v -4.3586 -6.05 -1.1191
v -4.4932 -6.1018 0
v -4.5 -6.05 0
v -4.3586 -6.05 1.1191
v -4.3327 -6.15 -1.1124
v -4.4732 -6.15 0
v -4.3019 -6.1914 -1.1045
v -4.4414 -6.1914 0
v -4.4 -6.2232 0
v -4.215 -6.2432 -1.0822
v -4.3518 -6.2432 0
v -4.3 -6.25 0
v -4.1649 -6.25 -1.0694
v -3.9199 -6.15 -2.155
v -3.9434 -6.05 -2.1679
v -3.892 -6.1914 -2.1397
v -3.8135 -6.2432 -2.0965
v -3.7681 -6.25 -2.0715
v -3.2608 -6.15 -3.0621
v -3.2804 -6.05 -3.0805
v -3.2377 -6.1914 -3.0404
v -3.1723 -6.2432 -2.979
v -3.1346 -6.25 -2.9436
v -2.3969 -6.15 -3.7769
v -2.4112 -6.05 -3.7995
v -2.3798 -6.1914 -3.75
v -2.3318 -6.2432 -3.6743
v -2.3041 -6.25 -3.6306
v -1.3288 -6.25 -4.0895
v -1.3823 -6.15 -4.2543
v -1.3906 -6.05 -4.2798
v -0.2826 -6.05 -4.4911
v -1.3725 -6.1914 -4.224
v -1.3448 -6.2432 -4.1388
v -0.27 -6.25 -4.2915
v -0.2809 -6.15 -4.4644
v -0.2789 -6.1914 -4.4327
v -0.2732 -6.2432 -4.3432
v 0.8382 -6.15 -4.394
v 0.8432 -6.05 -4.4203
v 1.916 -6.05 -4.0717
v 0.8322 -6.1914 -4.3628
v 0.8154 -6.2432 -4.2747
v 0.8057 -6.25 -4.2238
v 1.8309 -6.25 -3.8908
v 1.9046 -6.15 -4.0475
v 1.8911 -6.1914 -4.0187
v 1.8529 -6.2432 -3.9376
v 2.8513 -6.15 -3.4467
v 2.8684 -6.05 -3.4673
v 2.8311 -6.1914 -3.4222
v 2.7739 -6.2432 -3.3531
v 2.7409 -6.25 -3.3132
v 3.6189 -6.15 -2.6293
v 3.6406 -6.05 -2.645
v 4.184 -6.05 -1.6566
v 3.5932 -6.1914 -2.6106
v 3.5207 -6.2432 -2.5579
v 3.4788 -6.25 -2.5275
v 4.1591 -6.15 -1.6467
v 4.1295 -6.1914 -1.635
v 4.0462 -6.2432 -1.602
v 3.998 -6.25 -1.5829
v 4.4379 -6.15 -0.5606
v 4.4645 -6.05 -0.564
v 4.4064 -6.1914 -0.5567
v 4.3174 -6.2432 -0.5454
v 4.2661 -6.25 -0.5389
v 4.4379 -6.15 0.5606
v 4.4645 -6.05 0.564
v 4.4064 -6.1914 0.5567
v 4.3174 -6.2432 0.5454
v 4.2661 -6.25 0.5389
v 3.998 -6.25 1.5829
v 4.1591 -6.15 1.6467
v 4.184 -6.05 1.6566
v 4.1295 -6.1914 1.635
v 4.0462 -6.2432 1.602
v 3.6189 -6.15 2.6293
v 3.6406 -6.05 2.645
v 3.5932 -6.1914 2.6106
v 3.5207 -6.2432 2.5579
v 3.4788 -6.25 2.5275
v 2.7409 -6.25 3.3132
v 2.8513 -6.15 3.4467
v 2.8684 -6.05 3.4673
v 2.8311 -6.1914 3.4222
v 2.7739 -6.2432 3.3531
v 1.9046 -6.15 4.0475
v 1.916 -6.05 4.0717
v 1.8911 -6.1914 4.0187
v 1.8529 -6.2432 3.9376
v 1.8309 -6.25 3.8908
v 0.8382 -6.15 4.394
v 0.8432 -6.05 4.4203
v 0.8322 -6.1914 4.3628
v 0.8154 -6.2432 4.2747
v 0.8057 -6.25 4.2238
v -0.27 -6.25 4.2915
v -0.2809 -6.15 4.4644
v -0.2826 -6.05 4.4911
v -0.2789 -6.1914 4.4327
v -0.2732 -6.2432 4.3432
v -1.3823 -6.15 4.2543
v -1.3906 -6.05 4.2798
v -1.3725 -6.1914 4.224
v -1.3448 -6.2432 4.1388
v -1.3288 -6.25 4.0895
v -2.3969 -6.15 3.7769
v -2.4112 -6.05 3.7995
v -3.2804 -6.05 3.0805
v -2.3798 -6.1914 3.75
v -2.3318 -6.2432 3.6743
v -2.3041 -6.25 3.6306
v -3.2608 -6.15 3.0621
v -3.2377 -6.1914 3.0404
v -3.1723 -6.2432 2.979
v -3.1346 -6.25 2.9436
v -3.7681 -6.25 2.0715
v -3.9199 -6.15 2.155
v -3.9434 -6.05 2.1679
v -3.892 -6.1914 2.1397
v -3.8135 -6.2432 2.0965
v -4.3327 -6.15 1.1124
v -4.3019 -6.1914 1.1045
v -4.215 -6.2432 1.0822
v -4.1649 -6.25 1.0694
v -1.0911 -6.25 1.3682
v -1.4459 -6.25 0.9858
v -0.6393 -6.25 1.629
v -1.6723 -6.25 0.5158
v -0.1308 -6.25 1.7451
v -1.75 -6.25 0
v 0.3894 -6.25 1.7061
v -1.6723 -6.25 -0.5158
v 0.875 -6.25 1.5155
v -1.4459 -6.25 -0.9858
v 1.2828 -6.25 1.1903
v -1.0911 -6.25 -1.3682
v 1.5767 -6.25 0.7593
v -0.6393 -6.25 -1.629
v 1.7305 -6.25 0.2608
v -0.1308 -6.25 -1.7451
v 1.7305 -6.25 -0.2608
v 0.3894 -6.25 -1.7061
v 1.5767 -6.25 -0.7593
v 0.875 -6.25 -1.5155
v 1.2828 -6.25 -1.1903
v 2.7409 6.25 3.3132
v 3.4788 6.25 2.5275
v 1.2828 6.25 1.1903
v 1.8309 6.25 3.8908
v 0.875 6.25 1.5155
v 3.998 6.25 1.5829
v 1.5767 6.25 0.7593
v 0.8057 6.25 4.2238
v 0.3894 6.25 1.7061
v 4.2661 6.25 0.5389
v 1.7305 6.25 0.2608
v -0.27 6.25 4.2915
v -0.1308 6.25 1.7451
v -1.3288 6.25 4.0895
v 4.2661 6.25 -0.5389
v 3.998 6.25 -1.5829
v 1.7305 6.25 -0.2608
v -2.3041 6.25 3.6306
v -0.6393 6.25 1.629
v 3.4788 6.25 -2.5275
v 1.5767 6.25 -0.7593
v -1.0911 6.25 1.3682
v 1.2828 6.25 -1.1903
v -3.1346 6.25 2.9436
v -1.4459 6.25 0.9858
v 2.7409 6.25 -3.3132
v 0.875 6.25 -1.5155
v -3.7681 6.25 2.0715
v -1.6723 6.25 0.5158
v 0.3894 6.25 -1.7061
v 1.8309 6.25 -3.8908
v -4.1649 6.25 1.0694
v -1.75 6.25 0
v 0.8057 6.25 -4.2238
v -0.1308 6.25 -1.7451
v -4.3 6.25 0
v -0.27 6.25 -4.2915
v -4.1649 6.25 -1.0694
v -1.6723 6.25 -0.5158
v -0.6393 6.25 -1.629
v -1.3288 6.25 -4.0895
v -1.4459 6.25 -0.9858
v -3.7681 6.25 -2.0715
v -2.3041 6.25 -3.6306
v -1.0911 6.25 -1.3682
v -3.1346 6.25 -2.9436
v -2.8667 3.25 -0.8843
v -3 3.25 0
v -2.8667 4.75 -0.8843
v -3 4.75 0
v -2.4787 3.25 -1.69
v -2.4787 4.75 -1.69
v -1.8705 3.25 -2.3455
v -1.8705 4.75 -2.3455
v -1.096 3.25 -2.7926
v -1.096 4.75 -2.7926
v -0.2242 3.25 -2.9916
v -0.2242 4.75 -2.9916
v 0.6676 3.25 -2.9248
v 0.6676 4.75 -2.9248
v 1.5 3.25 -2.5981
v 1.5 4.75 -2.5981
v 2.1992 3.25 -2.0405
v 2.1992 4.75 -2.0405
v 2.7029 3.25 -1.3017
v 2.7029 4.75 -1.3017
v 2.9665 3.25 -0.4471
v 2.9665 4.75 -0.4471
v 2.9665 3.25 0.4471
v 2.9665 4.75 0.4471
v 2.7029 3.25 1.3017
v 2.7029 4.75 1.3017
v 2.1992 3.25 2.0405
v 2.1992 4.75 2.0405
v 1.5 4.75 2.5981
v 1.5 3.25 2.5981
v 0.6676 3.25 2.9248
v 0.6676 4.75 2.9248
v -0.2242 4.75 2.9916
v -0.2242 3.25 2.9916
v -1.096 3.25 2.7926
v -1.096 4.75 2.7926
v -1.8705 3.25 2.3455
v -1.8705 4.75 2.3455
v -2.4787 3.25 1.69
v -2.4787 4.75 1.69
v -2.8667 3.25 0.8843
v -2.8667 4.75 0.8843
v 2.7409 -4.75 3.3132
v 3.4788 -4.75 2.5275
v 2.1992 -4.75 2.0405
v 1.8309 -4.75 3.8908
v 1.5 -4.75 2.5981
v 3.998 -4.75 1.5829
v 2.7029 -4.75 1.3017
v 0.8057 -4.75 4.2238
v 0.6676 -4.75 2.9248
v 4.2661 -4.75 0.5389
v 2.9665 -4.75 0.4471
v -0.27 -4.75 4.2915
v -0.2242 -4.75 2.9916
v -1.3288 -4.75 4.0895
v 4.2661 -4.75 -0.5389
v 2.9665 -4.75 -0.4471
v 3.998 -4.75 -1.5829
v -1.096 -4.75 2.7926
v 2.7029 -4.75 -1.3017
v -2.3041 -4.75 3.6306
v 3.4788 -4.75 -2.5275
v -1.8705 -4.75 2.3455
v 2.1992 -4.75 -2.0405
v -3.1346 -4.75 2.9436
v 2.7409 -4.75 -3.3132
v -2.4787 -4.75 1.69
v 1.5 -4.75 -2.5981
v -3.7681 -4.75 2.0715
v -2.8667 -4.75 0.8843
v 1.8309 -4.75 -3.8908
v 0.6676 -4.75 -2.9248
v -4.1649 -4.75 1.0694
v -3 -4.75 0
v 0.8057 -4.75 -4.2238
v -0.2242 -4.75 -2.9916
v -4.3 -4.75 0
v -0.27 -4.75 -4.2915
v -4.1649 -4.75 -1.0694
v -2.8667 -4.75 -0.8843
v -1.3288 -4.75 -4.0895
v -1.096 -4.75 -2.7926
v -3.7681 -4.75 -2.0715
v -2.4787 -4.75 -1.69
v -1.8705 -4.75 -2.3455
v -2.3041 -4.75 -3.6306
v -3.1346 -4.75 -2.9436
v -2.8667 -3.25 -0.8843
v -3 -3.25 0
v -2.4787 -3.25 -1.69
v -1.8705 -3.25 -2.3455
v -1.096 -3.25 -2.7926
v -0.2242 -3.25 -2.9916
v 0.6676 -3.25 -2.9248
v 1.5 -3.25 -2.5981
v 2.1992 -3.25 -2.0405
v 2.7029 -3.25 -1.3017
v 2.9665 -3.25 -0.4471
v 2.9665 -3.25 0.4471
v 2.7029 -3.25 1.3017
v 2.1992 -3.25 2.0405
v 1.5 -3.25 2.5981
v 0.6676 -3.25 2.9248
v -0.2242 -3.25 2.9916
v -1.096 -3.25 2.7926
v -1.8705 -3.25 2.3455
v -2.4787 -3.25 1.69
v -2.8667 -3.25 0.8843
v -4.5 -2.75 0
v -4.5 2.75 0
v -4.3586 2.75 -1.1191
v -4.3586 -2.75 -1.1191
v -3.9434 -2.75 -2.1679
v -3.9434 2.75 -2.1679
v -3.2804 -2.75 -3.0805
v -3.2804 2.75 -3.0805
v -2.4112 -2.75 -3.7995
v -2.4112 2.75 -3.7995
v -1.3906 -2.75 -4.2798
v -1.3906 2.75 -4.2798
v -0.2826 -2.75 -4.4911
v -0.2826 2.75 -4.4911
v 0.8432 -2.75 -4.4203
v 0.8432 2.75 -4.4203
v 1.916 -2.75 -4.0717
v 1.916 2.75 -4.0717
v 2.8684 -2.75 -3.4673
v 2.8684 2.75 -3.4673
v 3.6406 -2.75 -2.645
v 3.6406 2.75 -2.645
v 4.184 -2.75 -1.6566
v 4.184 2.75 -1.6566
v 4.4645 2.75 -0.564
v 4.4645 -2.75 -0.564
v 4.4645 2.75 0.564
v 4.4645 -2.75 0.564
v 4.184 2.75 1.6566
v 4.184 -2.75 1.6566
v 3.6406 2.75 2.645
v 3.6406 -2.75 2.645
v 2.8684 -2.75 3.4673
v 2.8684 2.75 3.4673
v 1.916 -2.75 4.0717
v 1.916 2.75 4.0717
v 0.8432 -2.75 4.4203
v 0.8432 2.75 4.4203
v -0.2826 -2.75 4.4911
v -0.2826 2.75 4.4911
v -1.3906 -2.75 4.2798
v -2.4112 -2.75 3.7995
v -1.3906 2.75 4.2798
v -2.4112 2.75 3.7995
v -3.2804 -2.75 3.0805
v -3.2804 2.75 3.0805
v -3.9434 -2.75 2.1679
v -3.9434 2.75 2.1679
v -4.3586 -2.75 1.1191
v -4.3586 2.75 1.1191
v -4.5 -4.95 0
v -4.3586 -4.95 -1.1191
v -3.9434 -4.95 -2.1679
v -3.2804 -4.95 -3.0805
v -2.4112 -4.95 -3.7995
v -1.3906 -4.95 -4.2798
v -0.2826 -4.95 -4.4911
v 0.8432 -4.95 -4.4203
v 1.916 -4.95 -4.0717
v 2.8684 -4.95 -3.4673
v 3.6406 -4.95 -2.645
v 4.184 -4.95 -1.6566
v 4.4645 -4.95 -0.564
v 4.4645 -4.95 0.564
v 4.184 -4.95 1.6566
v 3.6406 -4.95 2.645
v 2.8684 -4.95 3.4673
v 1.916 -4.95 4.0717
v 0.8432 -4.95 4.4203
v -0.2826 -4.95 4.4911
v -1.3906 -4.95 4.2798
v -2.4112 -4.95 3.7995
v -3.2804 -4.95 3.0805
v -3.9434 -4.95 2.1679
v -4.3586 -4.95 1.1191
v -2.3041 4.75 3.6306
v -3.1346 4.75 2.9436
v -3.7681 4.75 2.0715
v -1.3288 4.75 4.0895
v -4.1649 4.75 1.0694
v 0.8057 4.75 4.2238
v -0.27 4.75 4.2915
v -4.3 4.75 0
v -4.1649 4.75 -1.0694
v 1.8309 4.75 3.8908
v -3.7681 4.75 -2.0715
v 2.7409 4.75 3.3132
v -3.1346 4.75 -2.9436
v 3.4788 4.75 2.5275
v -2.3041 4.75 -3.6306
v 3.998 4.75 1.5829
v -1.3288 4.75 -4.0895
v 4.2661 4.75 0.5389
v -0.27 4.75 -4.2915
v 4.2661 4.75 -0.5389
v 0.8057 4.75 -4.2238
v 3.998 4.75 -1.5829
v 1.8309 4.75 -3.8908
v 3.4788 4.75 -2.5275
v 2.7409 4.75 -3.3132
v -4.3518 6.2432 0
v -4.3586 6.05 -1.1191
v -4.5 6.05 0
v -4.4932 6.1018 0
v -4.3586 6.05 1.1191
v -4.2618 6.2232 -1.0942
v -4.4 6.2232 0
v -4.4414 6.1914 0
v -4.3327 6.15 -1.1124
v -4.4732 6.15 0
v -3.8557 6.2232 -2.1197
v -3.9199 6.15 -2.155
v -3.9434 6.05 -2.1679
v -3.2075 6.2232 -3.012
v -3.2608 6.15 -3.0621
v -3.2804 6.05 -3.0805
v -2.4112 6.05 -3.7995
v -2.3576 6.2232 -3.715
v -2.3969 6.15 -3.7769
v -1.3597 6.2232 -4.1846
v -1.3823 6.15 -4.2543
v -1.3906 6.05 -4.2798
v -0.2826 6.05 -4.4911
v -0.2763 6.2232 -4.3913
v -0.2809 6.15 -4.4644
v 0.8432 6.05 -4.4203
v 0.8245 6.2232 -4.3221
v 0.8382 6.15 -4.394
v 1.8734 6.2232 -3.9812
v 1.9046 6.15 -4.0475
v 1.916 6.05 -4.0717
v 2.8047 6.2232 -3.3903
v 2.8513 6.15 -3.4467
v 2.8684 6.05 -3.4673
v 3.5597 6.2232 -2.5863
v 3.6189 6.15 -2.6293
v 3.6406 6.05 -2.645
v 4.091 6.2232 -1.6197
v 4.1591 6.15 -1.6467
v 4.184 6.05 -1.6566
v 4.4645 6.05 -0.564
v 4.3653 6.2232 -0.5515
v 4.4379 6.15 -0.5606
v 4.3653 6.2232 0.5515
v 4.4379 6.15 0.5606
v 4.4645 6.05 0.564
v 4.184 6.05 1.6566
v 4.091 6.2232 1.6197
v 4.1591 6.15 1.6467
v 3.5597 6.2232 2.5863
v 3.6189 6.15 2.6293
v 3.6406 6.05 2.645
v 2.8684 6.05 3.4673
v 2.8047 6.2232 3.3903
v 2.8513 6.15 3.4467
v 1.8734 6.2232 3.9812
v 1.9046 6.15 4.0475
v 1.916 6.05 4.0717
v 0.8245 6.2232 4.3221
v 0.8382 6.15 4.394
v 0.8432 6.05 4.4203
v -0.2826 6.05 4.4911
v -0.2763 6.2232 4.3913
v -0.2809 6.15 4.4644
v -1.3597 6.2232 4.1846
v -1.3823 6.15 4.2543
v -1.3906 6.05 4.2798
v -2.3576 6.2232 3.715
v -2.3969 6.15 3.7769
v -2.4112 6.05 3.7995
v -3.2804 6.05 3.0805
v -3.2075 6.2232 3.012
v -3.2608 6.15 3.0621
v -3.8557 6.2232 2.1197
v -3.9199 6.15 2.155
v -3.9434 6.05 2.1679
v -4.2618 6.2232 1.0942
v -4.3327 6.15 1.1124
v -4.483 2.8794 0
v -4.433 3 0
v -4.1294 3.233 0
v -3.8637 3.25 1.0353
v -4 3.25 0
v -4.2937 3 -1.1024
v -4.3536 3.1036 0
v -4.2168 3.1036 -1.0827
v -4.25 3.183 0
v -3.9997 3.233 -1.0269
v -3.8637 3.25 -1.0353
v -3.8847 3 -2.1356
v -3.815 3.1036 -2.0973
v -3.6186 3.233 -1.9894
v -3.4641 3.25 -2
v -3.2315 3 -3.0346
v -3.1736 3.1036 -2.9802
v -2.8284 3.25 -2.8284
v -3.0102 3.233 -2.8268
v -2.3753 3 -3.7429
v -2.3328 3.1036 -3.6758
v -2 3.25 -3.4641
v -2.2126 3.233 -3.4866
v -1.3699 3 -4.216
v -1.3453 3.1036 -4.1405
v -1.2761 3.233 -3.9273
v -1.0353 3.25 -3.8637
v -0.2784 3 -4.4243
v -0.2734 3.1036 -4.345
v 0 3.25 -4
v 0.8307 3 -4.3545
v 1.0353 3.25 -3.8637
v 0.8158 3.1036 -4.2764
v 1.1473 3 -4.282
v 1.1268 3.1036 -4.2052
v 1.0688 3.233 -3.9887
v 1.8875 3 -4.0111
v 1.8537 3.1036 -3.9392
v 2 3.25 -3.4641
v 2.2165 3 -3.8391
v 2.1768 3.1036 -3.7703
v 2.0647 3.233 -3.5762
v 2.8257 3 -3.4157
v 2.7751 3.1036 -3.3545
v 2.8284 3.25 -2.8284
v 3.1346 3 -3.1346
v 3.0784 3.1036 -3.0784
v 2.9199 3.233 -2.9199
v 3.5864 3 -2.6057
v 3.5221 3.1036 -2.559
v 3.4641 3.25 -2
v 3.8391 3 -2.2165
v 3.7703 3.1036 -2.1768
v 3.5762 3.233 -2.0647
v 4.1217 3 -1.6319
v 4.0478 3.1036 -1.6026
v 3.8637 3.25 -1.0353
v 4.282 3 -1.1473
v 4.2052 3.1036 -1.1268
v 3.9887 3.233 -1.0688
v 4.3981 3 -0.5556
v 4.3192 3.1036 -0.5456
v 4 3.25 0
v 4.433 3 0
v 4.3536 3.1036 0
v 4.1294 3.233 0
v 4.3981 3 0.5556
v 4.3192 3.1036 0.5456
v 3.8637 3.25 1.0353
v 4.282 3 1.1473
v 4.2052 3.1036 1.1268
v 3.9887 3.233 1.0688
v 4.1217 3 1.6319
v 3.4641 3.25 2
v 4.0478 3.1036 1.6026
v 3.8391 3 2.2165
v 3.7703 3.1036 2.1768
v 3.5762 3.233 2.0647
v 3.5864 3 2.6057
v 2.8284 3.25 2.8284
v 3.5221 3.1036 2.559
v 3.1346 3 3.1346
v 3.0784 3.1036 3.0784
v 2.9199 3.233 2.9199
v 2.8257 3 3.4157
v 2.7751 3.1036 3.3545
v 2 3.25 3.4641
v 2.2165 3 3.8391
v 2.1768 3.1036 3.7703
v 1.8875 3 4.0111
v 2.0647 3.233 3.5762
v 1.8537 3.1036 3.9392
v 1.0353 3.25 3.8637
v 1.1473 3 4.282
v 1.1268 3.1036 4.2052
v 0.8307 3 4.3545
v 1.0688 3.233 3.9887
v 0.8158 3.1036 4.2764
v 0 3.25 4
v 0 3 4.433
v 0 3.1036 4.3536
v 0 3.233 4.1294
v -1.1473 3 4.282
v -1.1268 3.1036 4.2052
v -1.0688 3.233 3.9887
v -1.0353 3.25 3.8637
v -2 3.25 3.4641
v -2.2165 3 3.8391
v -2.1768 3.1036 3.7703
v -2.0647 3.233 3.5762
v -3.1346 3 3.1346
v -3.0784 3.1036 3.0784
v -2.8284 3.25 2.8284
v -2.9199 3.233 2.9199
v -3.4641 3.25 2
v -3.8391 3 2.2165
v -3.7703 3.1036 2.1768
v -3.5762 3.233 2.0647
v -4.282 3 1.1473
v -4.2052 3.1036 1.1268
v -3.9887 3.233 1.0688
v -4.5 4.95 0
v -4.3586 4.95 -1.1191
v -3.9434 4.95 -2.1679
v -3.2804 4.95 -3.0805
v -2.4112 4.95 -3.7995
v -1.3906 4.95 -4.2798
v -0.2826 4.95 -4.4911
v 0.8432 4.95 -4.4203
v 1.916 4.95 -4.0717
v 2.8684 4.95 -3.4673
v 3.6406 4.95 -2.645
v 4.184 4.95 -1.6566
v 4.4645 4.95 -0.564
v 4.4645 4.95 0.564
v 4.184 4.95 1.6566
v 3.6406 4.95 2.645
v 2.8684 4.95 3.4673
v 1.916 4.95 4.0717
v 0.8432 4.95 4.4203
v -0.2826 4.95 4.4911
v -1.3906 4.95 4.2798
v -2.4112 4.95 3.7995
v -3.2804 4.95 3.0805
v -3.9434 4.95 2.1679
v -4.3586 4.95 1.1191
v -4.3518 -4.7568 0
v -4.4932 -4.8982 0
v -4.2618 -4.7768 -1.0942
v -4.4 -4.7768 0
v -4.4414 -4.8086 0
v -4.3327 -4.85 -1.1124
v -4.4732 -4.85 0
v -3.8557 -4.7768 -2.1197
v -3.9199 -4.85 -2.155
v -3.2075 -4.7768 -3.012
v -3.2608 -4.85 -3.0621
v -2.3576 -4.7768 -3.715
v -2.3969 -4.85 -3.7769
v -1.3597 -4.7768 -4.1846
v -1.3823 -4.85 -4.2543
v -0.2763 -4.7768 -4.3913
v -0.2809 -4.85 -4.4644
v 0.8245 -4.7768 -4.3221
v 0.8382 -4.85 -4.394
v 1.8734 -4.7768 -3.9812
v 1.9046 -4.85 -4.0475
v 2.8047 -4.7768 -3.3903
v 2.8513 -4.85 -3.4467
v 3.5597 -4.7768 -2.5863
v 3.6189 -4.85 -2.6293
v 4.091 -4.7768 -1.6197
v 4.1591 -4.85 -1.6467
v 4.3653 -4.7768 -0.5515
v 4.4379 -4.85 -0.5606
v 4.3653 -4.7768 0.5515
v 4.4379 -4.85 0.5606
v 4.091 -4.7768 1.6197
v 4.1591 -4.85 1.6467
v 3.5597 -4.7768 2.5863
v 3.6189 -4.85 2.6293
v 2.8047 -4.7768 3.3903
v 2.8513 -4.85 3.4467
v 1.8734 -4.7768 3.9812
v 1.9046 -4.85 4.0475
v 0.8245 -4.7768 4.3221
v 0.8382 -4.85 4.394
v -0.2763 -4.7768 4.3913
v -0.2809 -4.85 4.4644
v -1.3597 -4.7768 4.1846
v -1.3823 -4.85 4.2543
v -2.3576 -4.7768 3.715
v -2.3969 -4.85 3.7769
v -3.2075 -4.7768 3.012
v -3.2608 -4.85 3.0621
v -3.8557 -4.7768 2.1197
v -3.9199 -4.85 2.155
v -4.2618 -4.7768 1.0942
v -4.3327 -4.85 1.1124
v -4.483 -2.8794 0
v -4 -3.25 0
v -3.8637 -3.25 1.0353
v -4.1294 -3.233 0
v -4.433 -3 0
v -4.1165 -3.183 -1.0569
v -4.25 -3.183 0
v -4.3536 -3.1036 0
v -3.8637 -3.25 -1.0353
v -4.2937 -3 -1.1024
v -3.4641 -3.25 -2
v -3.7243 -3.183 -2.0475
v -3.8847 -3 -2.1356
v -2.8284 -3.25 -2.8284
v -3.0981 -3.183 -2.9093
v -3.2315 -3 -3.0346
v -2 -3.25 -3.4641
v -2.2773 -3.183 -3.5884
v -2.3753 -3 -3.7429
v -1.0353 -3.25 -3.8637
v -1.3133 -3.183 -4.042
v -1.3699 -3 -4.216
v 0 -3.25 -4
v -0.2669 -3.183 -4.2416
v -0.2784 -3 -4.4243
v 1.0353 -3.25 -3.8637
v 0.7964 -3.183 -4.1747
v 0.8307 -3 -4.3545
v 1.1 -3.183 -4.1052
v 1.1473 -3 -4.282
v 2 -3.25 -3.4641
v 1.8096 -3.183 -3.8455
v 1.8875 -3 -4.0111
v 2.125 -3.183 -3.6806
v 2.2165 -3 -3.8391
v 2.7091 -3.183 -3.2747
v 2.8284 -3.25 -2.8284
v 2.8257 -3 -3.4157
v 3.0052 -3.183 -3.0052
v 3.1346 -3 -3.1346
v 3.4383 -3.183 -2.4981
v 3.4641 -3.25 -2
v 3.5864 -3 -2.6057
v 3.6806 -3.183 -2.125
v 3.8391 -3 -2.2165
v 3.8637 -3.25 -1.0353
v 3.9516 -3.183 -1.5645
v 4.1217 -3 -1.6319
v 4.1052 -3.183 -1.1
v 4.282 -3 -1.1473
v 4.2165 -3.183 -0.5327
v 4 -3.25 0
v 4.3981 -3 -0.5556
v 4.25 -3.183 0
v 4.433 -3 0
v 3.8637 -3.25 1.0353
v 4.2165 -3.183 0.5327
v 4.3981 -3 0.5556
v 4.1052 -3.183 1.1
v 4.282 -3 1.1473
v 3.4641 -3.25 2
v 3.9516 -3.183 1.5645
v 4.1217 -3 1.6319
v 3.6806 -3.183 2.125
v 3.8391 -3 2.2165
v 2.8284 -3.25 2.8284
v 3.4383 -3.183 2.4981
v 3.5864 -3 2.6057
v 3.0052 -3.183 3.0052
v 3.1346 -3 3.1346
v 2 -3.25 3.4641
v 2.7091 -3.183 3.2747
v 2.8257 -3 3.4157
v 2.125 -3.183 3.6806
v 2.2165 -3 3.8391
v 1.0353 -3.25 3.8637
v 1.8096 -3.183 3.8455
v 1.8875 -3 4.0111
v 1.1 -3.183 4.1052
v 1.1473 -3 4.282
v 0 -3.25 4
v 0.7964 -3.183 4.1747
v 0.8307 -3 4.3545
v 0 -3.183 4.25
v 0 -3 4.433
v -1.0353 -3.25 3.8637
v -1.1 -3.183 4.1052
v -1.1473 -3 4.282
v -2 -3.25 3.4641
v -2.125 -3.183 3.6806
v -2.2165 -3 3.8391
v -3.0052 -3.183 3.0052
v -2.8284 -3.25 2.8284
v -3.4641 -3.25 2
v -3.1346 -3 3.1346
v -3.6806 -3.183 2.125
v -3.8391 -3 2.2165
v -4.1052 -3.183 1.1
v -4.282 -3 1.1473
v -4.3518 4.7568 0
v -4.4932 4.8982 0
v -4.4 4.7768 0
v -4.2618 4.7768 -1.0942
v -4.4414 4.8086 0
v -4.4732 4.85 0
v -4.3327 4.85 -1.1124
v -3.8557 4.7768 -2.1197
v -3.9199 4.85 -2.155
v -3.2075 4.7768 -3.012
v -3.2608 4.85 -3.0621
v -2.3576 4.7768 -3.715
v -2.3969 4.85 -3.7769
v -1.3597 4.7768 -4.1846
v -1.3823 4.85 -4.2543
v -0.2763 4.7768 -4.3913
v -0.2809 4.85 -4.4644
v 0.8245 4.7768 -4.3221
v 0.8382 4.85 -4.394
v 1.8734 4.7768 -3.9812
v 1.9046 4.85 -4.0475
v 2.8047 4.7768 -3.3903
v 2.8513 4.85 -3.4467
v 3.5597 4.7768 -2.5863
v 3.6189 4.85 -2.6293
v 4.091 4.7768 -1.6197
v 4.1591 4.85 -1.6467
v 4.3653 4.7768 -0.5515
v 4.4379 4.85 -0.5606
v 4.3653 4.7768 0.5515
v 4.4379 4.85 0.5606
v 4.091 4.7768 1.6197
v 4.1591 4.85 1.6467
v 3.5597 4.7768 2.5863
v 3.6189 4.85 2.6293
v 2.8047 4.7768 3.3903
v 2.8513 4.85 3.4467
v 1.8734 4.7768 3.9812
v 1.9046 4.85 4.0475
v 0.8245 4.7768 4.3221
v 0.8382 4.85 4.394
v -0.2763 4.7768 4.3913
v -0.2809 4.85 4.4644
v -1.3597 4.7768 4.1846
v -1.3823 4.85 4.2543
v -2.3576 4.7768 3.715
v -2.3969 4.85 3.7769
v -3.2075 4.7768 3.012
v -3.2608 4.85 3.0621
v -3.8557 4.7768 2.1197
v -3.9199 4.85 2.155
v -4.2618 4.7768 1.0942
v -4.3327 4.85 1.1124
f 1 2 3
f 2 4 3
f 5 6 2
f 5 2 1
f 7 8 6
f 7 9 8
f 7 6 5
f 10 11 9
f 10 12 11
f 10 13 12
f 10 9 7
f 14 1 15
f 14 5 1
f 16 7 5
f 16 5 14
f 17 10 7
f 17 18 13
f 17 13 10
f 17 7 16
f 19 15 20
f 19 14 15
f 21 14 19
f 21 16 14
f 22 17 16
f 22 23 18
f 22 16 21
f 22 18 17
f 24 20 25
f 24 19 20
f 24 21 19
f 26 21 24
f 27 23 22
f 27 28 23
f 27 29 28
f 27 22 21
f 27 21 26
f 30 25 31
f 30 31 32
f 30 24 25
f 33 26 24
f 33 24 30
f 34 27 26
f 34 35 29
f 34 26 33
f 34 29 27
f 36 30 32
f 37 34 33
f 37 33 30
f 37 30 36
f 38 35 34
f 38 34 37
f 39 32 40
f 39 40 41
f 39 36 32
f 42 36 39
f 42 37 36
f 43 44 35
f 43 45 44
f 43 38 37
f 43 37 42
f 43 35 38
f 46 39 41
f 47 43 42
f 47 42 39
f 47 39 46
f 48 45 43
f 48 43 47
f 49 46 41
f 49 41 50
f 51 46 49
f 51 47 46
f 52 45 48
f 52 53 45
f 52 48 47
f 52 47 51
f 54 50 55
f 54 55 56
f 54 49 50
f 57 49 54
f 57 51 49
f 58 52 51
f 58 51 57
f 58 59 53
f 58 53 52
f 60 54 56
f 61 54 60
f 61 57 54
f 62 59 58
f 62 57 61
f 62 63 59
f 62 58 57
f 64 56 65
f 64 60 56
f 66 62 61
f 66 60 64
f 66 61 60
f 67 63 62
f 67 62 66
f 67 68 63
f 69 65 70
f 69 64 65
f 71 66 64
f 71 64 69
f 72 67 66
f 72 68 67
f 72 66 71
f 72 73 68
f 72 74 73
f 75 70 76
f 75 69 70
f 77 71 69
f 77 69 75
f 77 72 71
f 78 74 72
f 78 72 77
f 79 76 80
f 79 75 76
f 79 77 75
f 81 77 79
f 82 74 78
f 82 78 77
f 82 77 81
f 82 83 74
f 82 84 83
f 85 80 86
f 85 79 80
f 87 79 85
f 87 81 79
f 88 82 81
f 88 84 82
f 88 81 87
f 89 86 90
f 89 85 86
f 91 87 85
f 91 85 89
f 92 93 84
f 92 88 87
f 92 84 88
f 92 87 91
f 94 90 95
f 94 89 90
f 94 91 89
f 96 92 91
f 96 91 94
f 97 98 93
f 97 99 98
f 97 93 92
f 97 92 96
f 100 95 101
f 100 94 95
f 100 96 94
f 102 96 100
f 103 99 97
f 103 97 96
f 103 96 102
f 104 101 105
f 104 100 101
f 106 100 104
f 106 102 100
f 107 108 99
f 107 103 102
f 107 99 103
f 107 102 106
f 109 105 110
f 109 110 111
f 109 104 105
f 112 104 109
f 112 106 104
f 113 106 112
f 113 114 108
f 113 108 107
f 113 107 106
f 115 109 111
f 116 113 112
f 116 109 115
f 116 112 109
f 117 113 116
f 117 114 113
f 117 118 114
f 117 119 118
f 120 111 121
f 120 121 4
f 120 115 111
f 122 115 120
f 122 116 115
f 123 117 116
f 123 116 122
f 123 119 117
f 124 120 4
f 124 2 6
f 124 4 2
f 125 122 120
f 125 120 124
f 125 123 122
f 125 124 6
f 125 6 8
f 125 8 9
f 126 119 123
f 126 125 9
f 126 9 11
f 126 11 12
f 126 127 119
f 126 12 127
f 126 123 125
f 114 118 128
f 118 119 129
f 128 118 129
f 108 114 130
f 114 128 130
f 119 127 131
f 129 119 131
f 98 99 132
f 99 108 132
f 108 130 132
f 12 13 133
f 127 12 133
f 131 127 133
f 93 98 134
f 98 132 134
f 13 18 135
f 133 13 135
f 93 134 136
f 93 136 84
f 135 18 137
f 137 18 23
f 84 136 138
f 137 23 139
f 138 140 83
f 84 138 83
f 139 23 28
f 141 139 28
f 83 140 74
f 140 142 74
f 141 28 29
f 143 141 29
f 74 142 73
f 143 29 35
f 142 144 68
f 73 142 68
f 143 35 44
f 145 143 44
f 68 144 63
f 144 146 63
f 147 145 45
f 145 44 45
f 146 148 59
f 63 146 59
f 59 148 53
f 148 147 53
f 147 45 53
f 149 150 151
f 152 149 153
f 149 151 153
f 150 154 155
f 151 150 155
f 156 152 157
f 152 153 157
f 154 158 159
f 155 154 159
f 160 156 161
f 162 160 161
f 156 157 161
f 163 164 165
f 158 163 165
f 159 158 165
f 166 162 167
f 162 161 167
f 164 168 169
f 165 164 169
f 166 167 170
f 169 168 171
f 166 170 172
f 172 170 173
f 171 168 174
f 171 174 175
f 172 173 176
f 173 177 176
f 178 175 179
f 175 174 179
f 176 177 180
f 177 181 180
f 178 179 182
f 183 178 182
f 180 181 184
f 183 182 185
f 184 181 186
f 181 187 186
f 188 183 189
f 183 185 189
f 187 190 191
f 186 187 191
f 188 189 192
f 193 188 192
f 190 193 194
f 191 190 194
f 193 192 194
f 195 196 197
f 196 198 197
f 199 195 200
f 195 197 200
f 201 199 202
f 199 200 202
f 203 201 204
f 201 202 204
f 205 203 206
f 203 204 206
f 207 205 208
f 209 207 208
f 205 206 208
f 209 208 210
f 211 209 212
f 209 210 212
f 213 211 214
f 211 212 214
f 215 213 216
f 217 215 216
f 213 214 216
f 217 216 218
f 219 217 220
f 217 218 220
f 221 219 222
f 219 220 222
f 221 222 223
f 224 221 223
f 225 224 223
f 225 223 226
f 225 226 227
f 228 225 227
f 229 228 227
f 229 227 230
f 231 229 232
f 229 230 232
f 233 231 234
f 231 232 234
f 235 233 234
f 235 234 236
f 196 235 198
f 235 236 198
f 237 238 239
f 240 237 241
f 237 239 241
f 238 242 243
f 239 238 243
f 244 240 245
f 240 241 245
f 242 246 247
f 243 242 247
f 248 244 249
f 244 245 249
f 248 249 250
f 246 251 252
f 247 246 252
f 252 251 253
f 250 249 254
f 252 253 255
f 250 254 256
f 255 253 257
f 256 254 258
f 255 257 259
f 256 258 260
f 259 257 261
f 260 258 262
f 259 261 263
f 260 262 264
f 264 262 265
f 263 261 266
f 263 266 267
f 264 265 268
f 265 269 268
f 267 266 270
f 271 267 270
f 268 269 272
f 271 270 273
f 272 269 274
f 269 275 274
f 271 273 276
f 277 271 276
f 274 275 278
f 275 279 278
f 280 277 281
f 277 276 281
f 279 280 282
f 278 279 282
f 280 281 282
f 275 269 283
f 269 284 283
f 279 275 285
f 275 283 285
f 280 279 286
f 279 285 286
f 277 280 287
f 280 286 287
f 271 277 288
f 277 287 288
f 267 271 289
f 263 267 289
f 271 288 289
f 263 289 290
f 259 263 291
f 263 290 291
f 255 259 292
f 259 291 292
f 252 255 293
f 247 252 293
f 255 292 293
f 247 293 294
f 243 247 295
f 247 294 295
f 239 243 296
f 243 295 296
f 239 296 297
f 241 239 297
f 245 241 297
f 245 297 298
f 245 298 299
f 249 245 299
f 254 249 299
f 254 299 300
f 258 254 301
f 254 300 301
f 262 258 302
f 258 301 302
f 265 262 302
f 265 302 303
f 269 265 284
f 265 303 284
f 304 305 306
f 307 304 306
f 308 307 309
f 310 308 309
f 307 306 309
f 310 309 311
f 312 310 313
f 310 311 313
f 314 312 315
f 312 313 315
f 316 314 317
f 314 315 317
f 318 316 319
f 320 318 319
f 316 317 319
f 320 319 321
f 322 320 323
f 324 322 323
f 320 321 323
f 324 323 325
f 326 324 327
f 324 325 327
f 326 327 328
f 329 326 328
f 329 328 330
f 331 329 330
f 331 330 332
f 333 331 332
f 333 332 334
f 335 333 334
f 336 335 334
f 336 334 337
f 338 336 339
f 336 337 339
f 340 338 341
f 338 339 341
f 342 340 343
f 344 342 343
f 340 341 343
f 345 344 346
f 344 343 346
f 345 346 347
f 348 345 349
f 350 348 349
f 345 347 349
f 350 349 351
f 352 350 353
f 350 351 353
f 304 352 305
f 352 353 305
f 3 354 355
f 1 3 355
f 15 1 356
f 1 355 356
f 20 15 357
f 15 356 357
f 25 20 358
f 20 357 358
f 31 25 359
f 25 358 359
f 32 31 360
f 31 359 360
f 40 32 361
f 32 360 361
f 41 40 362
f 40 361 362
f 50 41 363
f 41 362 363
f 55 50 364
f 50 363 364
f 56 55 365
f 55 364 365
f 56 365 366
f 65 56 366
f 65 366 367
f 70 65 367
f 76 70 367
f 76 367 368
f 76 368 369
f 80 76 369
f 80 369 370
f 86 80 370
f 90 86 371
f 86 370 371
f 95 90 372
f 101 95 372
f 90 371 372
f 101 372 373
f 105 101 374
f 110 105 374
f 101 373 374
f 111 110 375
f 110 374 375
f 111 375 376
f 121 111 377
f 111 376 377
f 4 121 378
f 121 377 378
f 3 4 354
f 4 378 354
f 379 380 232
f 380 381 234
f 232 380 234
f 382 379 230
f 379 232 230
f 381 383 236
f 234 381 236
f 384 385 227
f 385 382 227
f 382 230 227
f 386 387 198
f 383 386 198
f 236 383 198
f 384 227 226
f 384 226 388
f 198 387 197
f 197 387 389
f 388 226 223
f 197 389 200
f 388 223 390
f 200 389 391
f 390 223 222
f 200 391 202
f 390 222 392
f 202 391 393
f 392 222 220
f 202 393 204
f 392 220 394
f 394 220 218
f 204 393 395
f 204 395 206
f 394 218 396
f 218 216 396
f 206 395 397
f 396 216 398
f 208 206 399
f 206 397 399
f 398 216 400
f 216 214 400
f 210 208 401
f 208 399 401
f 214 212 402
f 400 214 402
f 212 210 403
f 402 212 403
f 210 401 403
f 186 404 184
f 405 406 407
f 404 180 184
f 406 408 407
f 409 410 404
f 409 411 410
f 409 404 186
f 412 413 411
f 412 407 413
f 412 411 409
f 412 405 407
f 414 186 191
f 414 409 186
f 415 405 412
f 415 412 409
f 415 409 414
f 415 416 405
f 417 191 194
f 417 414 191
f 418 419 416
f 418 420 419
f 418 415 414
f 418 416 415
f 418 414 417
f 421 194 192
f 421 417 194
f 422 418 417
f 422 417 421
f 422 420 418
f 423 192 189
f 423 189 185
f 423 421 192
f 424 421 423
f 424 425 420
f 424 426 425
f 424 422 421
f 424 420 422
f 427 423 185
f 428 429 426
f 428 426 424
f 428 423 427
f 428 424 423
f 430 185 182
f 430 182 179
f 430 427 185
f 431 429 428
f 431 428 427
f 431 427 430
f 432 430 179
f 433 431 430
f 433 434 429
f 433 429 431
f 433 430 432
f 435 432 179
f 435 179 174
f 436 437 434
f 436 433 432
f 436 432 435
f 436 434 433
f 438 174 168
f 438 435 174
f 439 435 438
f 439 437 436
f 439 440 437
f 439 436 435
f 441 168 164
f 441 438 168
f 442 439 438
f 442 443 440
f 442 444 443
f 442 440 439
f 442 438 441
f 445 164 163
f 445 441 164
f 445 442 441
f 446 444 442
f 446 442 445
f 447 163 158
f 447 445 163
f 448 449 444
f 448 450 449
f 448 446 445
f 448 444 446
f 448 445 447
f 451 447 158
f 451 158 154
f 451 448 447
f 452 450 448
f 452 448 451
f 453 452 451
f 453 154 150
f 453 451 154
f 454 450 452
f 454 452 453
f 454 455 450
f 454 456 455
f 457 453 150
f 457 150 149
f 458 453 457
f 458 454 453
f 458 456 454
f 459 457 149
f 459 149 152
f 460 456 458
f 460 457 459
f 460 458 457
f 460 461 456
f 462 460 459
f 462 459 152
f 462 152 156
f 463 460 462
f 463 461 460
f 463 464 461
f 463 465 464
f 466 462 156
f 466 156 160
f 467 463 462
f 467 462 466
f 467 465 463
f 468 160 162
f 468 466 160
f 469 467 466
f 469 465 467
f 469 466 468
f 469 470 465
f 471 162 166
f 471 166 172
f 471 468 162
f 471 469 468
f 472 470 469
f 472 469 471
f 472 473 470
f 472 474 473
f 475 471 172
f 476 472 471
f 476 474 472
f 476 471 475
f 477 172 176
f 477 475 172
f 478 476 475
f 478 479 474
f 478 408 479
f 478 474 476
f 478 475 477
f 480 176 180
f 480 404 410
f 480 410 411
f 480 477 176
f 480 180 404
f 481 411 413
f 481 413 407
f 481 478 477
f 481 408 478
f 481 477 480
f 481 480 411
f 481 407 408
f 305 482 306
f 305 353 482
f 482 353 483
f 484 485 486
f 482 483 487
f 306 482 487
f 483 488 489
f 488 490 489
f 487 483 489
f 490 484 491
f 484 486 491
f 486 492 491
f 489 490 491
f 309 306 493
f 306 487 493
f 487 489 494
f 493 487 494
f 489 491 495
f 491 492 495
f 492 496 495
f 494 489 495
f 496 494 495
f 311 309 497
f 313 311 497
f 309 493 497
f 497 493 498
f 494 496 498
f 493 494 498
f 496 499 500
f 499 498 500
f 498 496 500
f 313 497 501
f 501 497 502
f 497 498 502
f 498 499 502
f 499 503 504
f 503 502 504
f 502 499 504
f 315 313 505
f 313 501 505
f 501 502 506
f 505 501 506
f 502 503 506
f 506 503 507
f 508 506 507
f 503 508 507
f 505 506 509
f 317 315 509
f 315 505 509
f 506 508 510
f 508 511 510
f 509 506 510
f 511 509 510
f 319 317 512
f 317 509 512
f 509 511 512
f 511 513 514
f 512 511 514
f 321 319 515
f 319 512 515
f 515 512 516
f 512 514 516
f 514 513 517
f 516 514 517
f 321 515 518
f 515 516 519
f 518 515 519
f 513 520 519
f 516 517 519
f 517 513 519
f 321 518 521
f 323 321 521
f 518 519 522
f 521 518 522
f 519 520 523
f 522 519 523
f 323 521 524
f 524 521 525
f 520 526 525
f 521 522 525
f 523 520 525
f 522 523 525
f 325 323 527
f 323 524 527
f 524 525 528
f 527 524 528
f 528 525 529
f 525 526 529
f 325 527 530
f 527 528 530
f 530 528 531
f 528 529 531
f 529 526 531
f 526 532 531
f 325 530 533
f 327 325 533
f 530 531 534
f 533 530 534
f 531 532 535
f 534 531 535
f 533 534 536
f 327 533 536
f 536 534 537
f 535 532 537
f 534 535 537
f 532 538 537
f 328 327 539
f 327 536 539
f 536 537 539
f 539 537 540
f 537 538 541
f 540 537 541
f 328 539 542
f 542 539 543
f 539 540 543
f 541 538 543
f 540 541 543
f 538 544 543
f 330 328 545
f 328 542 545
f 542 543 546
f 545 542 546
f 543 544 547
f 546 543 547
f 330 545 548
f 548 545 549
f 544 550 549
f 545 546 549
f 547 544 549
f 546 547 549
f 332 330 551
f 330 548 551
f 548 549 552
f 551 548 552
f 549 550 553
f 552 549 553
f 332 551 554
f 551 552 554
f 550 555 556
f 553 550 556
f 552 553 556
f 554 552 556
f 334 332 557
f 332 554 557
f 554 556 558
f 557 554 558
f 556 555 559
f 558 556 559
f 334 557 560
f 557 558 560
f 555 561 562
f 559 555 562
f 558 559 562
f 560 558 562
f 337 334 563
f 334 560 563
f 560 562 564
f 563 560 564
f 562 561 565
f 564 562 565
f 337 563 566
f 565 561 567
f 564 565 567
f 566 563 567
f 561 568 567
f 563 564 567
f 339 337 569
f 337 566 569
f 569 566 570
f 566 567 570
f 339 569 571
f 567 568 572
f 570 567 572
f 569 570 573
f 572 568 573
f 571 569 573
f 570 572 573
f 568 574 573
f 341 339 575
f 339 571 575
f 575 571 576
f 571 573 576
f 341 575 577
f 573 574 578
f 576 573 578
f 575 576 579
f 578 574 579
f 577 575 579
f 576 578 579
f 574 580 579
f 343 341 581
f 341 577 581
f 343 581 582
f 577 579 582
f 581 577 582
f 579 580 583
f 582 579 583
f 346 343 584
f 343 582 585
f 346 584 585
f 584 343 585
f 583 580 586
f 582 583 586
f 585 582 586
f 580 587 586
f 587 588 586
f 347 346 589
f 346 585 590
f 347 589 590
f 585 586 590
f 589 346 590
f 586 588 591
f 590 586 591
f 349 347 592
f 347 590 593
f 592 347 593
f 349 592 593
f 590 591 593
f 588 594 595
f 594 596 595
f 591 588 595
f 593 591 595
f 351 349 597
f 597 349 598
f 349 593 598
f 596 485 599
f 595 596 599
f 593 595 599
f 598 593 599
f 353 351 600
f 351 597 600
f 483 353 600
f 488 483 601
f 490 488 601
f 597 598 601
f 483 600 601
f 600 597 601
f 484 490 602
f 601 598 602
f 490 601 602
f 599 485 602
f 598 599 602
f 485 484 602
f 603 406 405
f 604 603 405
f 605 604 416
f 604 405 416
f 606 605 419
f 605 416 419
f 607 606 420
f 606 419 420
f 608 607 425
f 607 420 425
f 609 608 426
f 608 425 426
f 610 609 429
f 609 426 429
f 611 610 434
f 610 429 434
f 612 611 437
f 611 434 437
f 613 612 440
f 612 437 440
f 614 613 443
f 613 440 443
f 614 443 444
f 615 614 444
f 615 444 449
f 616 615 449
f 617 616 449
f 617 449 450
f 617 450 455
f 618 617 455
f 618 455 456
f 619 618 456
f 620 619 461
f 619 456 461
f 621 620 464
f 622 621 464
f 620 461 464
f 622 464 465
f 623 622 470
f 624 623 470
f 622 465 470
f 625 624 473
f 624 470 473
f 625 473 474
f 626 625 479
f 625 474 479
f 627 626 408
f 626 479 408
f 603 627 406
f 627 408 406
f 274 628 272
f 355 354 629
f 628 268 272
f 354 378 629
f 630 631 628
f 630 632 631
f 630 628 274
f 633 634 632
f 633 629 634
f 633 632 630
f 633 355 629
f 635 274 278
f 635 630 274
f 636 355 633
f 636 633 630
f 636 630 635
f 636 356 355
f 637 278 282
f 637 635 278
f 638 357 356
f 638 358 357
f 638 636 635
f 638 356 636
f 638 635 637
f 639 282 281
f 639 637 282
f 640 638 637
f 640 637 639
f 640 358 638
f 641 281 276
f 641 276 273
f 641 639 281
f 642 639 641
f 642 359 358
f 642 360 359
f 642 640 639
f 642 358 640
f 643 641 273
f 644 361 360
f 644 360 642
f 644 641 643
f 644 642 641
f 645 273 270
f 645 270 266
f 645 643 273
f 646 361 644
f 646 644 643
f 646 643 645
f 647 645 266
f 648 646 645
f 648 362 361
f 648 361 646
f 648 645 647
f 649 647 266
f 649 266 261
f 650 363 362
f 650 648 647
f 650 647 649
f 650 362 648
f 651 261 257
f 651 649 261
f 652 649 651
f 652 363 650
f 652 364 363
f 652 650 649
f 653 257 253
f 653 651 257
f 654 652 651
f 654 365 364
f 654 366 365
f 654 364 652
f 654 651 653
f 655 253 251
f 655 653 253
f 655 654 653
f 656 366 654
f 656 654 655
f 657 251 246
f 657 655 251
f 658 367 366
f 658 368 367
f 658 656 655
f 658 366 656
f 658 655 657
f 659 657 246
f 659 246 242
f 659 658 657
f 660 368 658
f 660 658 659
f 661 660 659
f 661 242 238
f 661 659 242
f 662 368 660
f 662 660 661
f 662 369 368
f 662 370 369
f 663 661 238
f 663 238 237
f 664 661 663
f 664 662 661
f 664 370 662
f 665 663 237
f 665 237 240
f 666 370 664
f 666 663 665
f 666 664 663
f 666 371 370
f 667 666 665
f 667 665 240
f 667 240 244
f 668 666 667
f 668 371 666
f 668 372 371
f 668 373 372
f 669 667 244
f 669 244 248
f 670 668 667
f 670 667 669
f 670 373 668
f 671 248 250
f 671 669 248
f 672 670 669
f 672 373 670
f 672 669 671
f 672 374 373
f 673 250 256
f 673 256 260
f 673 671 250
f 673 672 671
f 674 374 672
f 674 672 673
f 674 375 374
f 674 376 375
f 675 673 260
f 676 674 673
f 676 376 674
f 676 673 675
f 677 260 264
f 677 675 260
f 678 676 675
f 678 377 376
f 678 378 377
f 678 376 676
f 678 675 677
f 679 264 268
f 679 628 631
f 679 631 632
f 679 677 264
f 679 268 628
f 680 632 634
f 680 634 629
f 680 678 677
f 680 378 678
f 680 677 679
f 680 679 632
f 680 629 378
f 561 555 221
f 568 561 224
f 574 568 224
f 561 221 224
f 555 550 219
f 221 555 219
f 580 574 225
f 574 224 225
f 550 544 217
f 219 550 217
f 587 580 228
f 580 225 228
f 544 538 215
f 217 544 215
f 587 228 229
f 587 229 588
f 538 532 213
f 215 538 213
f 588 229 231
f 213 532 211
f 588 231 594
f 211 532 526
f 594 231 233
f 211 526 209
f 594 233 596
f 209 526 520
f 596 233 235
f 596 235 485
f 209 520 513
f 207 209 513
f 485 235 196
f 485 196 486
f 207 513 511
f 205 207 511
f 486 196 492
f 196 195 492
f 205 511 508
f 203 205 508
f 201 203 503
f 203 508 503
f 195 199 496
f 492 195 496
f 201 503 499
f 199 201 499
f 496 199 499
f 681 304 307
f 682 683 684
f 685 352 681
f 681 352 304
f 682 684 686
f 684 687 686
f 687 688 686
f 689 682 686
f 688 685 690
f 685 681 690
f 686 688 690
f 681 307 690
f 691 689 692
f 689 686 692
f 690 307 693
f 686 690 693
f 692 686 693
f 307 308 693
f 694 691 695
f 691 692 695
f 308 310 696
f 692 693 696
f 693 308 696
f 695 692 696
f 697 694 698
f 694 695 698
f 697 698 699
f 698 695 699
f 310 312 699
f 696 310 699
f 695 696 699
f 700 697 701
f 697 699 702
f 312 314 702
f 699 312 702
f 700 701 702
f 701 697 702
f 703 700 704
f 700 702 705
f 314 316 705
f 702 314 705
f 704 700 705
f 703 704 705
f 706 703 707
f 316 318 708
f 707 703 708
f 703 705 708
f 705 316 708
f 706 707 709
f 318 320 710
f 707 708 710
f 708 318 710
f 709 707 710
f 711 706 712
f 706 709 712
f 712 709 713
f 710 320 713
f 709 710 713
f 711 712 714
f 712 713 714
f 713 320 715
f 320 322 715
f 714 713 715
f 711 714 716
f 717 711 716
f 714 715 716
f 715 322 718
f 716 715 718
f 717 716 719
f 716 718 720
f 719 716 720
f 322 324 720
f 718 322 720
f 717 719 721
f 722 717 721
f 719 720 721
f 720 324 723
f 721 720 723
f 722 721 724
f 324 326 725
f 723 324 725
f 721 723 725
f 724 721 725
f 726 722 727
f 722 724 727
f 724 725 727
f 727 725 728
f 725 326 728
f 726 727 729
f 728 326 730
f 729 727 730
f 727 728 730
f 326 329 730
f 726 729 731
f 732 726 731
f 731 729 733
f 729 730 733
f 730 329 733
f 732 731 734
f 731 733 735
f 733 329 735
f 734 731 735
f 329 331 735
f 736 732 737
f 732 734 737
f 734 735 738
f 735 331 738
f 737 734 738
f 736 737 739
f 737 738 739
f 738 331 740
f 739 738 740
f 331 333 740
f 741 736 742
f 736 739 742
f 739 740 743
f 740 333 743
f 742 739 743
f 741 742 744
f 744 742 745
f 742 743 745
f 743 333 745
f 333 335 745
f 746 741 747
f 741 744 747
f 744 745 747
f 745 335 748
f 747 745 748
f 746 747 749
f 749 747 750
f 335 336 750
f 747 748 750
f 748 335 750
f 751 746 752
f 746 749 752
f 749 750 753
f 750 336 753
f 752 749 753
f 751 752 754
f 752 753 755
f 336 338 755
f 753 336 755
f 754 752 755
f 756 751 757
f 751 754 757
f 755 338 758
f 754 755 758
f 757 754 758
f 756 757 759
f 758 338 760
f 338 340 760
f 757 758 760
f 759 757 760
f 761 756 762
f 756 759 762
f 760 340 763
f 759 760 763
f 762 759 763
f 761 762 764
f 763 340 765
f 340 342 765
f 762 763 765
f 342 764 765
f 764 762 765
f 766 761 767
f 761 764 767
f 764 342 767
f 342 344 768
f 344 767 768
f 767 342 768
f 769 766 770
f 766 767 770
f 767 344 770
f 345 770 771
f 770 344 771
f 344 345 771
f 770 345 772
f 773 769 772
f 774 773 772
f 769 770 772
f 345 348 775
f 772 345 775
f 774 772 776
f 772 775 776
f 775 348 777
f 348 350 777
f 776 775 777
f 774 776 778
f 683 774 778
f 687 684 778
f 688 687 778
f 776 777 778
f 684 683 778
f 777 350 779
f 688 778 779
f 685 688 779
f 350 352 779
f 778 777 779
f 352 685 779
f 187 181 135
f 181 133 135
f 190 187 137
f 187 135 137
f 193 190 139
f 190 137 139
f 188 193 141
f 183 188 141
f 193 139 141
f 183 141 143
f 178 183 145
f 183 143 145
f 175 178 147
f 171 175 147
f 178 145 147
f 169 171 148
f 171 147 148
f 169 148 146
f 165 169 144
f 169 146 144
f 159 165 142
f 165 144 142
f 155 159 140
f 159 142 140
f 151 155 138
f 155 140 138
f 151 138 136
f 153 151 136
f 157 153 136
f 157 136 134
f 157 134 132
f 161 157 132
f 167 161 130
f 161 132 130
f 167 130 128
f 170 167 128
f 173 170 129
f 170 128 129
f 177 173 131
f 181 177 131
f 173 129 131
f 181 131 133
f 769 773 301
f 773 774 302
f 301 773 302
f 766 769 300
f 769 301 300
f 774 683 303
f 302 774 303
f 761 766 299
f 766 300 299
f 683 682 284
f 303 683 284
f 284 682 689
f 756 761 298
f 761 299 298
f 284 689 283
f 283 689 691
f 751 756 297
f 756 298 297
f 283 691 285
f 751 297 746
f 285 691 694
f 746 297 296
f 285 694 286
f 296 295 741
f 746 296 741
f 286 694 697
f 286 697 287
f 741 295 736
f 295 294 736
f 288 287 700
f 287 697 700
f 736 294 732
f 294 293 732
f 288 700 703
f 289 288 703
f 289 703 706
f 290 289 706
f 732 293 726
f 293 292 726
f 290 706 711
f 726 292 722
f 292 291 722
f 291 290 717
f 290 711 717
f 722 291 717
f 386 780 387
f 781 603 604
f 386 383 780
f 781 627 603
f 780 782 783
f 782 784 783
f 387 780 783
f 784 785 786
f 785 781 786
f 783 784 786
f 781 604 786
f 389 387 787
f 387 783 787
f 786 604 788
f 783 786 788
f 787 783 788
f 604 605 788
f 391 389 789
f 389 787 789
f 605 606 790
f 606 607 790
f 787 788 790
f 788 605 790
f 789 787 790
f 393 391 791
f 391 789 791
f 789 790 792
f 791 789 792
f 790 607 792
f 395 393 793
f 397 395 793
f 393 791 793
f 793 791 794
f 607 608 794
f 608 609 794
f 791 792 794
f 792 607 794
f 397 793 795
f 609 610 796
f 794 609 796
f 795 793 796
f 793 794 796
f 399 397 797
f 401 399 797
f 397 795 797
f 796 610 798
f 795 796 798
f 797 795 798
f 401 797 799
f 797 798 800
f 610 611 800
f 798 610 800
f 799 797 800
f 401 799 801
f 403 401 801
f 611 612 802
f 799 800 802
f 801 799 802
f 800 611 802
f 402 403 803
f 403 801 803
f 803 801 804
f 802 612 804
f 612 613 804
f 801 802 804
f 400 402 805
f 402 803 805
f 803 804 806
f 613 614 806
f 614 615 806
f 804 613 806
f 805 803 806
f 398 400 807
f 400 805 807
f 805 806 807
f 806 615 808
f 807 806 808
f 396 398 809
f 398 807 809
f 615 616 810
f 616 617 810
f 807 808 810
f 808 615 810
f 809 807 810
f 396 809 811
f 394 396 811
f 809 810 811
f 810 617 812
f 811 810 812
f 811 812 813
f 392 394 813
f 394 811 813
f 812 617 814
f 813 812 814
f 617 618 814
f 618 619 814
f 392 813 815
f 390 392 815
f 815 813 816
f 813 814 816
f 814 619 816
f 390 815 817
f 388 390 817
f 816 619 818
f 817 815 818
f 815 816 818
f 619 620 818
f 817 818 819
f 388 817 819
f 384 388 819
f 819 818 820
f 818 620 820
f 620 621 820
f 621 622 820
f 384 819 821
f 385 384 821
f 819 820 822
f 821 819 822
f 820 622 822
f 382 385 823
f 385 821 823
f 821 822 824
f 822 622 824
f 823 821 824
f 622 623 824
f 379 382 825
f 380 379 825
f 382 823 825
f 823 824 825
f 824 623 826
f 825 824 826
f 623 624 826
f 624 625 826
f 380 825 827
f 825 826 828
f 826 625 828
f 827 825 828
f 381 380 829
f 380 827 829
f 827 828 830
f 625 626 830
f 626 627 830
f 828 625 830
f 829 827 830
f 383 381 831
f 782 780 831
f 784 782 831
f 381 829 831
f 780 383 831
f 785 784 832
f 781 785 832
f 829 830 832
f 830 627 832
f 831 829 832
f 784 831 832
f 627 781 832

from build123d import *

# Parameters (mm, degrees)
FILLET1_R = 0.5
FILLET2_R = 0.2


with BuildPart() as part:
    # Sketch1 → Revolve1 (revolve)
    with BuildSketch(Plane.XY, mode=Mode.PRIVATE) as revolve1_sk:
        Polygon((1.75, 6.25), (1.75, -6.25), (4.5, -6.25), (4.5, -4.75), (3, -4.75), (3, -3.25), (4.5, -3.25), (4.5, 3.25), (3, 3.25), (3, 4.75), (4.5, 4.75), (4.5, 6.25), align=None)
    revolve(revolve1_sk.sketch.rotate(Axis((0, 6.25, 0), (0, -1, 0)), 180), axis=Axis((0, 6.25, 0), (0, -1, 0)))

    # Fillet1
    fillet1_edges = [part.edges().sort_by_distance(p)[0] for p in [
        (4.5, 3.25, 0),
        (4.5, -3.25, 0),
    ]]
    fillet(fillet1_edges, radius=FILLET1_R)

    # Fillet2
    fillet2_edges = [part.edges().sort_by_distance(p)[0] for p in [
        (4.5, -4.75, 0),
        (4.5, -6.25, 0),
        (4.5, 6.25, 0),
        (4.5, 4.75, 0),
    ]]
    fillet(fillet2_edges, radius=FILLET2_R)


solid = part.part
